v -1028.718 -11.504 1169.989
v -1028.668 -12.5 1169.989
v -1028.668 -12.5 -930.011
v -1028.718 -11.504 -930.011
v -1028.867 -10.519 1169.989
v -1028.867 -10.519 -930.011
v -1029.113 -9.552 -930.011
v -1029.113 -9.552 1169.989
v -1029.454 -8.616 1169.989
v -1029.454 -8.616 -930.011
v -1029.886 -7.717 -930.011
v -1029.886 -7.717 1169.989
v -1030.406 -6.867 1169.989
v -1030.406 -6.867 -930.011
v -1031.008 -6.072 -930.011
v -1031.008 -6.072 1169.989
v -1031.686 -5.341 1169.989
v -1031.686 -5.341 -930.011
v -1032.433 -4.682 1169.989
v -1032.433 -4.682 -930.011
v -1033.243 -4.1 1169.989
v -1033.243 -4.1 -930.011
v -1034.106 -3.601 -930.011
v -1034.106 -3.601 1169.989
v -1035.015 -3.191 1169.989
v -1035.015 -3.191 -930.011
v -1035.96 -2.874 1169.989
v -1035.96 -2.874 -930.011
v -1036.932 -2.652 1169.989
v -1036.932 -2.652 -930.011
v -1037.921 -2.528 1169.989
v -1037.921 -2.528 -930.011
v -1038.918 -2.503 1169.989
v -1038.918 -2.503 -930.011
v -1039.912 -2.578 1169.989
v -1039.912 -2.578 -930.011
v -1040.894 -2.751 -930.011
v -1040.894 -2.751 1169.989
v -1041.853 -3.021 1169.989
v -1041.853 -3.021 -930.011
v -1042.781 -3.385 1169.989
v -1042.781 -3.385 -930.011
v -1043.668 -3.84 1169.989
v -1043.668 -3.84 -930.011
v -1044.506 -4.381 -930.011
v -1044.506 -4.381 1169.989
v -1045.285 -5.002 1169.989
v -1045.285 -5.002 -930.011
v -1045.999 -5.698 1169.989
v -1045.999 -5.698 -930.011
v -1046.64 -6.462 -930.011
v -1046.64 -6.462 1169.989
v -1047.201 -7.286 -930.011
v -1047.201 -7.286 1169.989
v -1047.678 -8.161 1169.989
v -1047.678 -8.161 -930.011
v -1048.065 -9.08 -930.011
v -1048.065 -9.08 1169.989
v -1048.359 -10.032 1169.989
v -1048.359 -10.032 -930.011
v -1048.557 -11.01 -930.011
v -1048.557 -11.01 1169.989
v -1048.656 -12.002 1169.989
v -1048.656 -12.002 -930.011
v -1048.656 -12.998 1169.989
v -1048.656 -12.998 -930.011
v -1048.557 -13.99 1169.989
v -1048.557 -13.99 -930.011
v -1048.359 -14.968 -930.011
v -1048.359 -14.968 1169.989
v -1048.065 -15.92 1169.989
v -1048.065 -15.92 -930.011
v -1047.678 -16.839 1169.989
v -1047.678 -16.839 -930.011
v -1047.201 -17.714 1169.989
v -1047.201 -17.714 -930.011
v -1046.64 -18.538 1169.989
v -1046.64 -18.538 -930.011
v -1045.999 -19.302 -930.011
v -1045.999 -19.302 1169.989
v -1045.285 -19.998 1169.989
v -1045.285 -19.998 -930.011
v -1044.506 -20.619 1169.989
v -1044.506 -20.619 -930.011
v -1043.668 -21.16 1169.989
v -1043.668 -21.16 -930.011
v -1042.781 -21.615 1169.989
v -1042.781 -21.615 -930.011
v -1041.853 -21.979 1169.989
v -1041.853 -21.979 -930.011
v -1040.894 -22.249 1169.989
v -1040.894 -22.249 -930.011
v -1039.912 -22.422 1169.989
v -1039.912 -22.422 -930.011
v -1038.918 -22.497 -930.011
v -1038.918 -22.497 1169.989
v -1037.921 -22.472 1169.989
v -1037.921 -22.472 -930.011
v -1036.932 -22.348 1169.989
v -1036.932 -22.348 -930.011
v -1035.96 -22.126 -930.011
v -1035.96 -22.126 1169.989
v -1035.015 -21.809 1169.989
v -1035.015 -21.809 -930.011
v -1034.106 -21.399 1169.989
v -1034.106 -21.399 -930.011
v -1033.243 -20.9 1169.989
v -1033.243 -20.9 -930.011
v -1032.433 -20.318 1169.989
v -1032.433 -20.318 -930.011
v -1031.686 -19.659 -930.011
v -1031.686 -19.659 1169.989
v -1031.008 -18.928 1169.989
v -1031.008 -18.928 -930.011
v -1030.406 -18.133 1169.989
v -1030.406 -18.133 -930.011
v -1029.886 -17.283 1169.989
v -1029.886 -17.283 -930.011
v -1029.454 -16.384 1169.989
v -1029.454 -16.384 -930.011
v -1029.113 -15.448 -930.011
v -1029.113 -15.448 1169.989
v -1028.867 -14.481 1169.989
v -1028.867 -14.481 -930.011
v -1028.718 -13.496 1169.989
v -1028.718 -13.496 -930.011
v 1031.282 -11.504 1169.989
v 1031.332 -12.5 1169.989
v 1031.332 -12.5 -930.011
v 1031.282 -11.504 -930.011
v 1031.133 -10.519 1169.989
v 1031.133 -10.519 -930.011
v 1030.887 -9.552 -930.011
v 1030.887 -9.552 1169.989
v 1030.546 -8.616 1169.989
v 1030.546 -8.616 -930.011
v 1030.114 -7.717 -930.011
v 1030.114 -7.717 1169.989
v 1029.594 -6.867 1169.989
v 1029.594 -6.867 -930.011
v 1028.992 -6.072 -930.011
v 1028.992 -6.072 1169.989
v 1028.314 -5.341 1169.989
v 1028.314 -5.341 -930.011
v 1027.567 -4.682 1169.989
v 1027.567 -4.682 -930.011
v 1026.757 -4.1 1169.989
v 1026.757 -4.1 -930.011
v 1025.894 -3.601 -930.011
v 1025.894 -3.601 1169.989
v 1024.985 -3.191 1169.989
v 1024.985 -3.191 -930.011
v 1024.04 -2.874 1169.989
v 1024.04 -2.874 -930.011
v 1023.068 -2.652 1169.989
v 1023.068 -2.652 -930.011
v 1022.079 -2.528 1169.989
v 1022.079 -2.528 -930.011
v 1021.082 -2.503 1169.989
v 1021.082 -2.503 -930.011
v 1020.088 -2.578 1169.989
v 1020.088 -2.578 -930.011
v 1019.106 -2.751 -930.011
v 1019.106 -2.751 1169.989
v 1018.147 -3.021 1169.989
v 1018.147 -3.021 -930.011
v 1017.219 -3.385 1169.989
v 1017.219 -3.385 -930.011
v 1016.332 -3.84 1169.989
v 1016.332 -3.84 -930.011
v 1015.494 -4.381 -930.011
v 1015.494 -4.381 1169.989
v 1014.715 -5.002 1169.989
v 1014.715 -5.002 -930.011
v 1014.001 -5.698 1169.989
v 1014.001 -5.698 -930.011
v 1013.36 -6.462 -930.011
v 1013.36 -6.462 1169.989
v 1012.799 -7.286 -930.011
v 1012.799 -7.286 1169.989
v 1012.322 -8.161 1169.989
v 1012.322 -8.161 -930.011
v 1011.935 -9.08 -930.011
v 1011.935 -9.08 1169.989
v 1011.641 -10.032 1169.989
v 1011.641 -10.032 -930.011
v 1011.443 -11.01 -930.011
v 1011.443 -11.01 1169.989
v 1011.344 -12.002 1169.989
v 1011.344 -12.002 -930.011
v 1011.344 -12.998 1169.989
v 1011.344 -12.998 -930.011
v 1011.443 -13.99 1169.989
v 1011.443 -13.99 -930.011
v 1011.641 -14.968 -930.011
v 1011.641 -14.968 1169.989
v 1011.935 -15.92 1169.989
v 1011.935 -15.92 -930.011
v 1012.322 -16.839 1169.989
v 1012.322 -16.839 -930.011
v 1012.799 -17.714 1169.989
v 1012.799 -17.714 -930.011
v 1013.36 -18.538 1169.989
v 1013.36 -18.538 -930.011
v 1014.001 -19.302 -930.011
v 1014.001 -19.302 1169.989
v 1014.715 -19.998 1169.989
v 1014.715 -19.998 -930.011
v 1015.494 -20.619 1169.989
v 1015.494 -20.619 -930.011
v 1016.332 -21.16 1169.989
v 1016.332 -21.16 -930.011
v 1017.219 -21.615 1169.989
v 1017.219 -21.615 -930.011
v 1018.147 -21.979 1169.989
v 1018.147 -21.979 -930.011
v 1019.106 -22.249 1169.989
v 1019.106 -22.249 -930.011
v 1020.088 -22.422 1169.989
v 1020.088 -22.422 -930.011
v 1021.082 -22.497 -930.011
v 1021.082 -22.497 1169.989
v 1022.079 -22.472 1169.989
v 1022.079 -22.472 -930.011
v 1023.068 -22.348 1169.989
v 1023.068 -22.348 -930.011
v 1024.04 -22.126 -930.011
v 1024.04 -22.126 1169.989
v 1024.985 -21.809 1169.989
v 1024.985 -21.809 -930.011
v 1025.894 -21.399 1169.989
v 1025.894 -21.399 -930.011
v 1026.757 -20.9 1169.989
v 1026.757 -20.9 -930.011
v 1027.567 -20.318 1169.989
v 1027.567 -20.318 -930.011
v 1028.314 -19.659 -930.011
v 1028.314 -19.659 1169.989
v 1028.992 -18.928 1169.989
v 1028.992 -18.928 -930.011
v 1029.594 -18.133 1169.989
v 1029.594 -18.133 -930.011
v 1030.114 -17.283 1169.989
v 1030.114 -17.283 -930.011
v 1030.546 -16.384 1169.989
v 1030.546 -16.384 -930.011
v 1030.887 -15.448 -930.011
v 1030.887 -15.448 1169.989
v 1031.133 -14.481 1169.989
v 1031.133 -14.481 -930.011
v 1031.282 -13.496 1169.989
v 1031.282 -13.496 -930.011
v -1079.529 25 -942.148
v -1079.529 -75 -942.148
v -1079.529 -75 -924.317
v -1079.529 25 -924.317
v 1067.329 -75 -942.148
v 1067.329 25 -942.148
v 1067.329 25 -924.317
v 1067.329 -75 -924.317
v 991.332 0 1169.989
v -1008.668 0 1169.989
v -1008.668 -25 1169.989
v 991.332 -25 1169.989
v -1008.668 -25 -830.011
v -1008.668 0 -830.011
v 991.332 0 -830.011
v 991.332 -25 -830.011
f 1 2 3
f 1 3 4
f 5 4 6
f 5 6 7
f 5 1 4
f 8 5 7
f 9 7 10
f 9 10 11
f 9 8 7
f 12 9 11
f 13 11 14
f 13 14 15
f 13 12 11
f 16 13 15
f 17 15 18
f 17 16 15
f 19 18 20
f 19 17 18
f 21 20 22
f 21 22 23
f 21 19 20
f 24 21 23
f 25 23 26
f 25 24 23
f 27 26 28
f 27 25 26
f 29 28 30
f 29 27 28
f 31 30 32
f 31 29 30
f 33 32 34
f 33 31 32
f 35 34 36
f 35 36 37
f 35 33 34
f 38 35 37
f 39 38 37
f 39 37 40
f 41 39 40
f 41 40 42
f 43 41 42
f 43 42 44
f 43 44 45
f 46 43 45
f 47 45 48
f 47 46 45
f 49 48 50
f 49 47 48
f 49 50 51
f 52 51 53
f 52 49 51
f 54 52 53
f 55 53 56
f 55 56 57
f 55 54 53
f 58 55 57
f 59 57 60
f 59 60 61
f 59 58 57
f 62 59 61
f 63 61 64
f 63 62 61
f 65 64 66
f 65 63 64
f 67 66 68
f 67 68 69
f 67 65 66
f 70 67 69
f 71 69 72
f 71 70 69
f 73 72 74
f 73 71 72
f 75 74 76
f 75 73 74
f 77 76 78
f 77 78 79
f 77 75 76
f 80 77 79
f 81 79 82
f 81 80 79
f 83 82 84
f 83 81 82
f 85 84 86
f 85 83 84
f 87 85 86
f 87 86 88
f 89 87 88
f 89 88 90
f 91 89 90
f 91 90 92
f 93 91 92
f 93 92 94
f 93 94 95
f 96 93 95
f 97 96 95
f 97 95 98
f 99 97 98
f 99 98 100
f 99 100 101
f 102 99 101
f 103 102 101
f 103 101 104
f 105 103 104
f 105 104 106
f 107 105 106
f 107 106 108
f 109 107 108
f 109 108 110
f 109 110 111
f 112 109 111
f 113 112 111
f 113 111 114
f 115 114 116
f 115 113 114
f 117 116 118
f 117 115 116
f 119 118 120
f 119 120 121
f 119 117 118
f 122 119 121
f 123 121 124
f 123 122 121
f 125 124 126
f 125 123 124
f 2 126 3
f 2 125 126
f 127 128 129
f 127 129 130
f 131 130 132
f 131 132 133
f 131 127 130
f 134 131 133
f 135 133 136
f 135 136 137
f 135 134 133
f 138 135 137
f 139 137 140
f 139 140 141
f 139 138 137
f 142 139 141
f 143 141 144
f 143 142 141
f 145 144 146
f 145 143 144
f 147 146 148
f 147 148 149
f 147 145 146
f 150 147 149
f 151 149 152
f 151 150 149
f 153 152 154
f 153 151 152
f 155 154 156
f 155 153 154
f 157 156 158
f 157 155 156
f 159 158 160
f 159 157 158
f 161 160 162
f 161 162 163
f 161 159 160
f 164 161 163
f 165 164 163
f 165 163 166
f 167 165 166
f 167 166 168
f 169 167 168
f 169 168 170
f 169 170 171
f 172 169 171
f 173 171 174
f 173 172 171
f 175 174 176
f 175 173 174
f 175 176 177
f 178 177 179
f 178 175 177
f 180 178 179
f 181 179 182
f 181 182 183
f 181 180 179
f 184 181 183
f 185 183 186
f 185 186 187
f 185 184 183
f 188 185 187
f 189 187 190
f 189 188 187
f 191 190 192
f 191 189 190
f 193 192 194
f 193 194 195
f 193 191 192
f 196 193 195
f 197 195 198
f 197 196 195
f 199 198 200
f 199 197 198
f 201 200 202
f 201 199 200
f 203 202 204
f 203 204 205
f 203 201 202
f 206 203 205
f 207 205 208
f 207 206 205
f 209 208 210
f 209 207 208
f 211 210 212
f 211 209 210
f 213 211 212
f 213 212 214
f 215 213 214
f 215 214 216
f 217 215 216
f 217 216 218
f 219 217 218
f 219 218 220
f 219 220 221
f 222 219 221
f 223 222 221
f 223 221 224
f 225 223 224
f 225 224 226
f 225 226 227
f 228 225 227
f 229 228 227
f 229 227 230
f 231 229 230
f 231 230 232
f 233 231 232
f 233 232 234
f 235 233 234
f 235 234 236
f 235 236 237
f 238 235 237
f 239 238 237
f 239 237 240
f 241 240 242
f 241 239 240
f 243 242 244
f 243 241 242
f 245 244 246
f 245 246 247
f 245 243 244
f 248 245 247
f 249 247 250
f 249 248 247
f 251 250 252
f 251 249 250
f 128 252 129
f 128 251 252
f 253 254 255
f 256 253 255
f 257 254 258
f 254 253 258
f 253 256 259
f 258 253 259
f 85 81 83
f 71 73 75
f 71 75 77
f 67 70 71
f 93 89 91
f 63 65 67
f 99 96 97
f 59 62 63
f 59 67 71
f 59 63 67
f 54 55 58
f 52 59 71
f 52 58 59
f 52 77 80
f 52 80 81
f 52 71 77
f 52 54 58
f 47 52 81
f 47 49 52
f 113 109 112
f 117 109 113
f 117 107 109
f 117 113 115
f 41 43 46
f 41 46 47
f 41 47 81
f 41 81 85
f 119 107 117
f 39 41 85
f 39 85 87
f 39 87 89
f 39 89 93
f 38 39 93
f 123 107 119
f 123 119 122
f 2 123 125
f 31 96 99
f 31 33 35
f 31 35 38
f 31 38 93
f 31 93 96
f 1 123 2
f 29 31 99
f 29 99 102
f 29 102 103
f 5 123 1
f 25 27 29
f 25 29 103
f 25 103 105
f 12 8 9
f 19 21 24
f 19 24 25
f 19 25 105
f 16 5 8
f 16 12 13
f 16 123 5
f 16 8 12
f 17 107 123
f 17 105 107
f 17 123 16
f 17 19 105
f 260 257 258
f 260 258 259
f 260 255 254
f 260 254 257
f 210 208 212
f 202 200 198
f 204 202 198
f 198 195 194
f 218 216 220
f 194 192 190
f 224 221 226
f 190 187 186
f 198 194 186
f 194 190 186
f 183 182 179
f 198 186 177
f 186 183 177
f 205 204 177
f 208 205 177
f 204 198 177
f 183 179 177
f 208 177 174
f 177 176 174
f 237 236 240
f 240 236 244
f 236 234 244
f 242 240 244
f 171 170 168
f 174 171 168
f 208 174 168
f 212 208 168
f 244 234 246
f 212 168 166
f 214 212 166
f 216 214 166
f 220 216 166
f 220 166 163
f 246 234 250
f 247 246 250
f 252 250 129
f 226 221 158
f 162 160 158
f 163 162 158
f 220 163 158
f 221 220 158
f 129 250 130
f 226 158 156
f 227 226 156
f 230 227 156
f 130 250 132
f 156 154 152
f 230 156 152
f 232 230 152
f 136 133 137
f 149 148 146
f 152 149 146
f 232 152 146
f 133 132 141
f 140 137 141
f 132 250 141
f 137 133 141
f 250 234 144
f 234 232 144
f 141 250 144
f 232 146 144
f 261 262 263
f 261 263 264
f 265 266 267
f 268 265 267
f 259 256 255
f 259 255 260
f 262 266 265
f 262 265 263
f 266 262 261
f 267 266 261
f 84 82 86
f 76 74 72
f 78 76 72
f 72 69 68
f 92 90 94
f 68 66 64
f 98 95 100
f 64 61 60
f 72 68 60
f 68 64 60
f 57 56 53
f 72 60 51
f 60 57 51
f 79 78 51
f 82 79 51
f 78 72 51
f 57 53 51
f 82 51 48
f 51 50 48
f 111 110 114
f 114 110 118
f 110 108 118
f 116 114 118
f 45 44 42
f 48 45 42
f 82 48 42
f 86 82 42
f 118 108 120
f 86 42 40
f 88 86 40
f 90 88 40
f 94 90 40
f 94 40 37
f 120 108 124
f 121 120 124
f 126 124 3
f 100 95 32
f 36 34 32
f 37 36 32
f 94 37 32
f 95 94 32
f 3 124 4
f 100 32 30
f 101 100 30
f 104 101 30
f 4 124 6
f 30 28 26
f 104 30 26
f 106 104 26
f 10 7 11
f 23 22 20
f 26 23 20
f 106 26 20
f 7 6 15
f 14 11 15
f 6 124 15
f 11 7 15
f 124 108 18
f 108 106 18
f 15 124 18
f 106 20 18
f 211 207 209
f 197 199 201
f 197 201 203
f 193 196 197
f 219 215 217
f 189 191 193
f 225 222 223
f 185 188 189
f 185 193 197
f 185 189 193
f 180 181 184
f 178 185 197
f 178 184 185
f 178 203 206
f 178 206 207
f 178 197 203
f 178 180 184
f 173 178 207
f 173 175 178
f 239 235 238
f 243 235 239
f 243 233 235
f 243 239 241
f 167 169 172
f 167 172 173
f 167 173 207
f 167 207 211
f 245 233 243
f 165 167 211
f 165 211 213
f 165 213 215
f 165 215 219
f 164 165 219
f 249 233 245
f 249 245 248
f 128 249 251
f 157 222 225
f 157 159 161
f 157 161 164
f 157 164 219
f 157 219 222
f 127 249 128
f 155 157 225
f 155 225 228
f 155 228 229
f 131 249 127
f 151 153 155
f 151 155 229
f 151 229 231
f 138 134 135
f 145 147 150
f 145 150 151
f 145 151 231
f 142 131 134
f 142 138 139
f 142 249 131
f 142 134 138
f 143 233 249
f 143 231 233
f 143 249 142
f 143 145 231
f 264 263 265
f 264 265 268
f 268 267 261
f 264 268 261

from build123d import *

# Parameters (mm, degrees)
F0_W          = 2000
F0_H          = 2000
F1_DEPTH      = 25
F2_R          = 10
F3_DEPTH      = 2100
F4_W          = 2146.857380867
F4_H          = 17.8310871124
F5_DEPTH      = 50
F5_DEPTH_BACK = 50


with BuildPart() as f1:
    # F0 (on Front) → F1 (new body)
    with BuildSketch(Plane.XZ):
        with Locations((-8.6683034897, 169.989340106)):
            Rectangle(F0_W, F0_H)
    extrude(amount=F1_DEPTH)


with BuildPart() as f3:
    # F2 (on face) → F3 (new body)
    with BuildSketch(Plane.XY.offset(1169.989340106)):
        with Locations((-1038.6683034897, -12.5)):
            Circle(F2_R)
    extrude(amount=-F3_DEPTH)


with BuildPart() as f3b:
    # F2 (on face) → F3, piece 2 (new body)
    with BuildSketch(Plane.XY.offset(1169.989340106)):
        with Locations((1021.3316965103, -12.5)):
            Circle(F2_R)
    extrude(amount=-F3_DEPTH)


with BuildPart() as f5:
    # F4 (on face) → F5 (new body, two sides)
    with BuildSketch(Plane.XZ.offset(25)) as f5_sk:
        with Locations((-6.0998797417, -933.232665062)):
            Rectangle(F4_W, F4_H)
    extrude(amount=-F5_DEPTH)
    extrude(f5_sk.sketch, amount=F5_DEPTH_BACK)


solid = Compound([f1.part, f3.part, f3b.part, f5.part])
